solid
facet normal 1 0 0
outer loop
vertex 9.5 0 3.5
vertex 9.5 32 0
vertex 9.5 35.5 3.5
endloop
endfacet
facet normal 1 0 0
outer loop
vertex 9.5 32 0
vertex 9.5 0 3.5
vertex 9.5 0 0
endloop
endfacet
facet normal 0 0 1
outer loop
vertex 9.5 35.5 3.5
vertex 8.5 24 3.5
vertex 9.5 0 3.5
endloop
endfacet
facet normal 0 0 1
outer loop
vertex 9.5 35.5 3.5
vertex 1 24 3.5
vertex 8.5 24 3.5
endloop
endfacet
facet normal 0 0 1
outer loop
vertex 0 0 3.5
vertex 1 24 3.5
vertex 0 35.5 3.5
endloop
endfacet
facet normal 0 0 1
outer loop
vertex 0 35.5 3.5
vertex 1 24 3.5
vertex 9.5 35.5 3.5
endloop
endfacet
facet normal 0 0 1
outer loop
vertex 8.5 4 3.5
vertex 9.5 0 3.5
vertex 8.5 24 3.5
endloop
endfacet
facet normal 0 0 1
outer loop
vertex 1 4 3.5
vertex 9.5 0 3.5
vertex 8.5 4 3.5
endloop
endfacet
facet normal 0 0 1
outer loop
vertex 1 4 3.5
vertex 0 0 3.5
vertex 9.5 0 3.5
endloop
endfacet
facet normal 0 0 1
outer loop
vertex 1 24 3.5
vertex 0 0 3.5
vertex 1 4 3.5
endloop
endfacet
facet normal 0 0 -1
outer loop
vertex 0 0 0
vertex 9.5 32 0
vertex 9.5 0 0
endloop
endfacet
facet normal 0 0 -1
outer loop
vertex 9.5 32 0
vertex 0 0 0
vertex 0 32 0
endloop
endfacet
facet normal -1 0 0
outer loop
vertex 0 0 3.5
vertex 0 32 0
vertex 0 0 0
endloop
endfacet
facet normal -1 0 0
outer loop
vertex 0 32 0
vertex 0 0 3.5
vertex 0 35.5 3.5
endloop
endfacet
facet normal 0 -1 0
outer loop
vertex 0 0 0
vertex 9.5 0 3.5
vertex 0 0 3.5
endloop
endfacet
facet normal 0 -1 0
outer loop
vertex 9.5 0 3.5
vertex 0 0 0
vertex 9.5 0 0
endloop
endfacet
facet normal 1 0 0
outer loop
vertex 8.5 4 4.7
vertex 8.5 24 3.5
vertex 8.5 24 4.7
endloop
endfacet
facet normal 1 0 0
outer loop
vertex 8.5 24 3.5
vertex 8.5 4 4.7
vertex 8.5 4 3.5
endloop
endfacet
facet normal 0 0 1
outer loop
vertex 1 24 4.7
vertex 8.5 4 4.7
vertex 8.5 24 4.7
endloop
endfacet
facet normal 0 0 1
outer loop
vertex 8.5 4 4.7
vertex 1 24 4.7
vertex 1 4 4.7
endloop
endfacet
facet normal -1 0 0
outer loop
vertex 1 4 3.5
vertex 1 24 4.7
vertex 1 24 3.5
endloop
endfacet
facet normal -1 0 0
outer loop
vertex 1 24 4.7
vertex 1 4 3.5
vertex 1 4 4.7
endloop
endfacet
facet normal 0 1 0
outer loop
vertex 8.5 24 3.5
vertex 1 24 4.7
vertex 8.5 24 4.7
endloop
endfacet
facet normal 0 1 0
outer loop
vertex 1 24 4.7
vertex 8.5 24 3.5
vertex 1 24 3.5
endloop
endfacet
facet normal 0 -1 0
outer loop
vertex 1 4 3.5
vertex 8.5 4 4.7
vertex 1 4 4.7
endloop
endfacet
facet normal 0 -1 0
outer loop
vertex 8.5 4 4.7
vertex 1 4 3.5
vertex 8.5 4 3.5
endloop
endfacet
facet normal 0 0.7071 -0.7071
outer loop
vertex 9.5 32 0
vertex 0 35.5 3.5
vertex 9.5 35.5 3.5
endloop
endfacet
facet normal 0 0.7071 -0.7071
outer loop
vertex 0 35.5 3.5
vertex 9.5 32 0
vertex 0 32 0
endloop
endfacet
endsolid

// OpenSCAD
/*
cube([12, 32, 3.5]);
translate([(12-9.5)/2,4,3.5])
cube([9.5, 20,1.2]);
translate([0,32,0])
rotate([0,90,0])
linear_extrude(12) polygon([[0,0], [-3.5,0], [-3.5,3.5]]);
*/


cube([9.5, 32, 3.5]);
translate([(9.5-7.5)/2,4,3.5])
cube([7.5, 20,1.2]);
translate([0,32,0])
rotate([0,90,0])
linear_extrude(9.5) polygon([[0,0], [-3.5,0], [-3.5,3.5]]);
